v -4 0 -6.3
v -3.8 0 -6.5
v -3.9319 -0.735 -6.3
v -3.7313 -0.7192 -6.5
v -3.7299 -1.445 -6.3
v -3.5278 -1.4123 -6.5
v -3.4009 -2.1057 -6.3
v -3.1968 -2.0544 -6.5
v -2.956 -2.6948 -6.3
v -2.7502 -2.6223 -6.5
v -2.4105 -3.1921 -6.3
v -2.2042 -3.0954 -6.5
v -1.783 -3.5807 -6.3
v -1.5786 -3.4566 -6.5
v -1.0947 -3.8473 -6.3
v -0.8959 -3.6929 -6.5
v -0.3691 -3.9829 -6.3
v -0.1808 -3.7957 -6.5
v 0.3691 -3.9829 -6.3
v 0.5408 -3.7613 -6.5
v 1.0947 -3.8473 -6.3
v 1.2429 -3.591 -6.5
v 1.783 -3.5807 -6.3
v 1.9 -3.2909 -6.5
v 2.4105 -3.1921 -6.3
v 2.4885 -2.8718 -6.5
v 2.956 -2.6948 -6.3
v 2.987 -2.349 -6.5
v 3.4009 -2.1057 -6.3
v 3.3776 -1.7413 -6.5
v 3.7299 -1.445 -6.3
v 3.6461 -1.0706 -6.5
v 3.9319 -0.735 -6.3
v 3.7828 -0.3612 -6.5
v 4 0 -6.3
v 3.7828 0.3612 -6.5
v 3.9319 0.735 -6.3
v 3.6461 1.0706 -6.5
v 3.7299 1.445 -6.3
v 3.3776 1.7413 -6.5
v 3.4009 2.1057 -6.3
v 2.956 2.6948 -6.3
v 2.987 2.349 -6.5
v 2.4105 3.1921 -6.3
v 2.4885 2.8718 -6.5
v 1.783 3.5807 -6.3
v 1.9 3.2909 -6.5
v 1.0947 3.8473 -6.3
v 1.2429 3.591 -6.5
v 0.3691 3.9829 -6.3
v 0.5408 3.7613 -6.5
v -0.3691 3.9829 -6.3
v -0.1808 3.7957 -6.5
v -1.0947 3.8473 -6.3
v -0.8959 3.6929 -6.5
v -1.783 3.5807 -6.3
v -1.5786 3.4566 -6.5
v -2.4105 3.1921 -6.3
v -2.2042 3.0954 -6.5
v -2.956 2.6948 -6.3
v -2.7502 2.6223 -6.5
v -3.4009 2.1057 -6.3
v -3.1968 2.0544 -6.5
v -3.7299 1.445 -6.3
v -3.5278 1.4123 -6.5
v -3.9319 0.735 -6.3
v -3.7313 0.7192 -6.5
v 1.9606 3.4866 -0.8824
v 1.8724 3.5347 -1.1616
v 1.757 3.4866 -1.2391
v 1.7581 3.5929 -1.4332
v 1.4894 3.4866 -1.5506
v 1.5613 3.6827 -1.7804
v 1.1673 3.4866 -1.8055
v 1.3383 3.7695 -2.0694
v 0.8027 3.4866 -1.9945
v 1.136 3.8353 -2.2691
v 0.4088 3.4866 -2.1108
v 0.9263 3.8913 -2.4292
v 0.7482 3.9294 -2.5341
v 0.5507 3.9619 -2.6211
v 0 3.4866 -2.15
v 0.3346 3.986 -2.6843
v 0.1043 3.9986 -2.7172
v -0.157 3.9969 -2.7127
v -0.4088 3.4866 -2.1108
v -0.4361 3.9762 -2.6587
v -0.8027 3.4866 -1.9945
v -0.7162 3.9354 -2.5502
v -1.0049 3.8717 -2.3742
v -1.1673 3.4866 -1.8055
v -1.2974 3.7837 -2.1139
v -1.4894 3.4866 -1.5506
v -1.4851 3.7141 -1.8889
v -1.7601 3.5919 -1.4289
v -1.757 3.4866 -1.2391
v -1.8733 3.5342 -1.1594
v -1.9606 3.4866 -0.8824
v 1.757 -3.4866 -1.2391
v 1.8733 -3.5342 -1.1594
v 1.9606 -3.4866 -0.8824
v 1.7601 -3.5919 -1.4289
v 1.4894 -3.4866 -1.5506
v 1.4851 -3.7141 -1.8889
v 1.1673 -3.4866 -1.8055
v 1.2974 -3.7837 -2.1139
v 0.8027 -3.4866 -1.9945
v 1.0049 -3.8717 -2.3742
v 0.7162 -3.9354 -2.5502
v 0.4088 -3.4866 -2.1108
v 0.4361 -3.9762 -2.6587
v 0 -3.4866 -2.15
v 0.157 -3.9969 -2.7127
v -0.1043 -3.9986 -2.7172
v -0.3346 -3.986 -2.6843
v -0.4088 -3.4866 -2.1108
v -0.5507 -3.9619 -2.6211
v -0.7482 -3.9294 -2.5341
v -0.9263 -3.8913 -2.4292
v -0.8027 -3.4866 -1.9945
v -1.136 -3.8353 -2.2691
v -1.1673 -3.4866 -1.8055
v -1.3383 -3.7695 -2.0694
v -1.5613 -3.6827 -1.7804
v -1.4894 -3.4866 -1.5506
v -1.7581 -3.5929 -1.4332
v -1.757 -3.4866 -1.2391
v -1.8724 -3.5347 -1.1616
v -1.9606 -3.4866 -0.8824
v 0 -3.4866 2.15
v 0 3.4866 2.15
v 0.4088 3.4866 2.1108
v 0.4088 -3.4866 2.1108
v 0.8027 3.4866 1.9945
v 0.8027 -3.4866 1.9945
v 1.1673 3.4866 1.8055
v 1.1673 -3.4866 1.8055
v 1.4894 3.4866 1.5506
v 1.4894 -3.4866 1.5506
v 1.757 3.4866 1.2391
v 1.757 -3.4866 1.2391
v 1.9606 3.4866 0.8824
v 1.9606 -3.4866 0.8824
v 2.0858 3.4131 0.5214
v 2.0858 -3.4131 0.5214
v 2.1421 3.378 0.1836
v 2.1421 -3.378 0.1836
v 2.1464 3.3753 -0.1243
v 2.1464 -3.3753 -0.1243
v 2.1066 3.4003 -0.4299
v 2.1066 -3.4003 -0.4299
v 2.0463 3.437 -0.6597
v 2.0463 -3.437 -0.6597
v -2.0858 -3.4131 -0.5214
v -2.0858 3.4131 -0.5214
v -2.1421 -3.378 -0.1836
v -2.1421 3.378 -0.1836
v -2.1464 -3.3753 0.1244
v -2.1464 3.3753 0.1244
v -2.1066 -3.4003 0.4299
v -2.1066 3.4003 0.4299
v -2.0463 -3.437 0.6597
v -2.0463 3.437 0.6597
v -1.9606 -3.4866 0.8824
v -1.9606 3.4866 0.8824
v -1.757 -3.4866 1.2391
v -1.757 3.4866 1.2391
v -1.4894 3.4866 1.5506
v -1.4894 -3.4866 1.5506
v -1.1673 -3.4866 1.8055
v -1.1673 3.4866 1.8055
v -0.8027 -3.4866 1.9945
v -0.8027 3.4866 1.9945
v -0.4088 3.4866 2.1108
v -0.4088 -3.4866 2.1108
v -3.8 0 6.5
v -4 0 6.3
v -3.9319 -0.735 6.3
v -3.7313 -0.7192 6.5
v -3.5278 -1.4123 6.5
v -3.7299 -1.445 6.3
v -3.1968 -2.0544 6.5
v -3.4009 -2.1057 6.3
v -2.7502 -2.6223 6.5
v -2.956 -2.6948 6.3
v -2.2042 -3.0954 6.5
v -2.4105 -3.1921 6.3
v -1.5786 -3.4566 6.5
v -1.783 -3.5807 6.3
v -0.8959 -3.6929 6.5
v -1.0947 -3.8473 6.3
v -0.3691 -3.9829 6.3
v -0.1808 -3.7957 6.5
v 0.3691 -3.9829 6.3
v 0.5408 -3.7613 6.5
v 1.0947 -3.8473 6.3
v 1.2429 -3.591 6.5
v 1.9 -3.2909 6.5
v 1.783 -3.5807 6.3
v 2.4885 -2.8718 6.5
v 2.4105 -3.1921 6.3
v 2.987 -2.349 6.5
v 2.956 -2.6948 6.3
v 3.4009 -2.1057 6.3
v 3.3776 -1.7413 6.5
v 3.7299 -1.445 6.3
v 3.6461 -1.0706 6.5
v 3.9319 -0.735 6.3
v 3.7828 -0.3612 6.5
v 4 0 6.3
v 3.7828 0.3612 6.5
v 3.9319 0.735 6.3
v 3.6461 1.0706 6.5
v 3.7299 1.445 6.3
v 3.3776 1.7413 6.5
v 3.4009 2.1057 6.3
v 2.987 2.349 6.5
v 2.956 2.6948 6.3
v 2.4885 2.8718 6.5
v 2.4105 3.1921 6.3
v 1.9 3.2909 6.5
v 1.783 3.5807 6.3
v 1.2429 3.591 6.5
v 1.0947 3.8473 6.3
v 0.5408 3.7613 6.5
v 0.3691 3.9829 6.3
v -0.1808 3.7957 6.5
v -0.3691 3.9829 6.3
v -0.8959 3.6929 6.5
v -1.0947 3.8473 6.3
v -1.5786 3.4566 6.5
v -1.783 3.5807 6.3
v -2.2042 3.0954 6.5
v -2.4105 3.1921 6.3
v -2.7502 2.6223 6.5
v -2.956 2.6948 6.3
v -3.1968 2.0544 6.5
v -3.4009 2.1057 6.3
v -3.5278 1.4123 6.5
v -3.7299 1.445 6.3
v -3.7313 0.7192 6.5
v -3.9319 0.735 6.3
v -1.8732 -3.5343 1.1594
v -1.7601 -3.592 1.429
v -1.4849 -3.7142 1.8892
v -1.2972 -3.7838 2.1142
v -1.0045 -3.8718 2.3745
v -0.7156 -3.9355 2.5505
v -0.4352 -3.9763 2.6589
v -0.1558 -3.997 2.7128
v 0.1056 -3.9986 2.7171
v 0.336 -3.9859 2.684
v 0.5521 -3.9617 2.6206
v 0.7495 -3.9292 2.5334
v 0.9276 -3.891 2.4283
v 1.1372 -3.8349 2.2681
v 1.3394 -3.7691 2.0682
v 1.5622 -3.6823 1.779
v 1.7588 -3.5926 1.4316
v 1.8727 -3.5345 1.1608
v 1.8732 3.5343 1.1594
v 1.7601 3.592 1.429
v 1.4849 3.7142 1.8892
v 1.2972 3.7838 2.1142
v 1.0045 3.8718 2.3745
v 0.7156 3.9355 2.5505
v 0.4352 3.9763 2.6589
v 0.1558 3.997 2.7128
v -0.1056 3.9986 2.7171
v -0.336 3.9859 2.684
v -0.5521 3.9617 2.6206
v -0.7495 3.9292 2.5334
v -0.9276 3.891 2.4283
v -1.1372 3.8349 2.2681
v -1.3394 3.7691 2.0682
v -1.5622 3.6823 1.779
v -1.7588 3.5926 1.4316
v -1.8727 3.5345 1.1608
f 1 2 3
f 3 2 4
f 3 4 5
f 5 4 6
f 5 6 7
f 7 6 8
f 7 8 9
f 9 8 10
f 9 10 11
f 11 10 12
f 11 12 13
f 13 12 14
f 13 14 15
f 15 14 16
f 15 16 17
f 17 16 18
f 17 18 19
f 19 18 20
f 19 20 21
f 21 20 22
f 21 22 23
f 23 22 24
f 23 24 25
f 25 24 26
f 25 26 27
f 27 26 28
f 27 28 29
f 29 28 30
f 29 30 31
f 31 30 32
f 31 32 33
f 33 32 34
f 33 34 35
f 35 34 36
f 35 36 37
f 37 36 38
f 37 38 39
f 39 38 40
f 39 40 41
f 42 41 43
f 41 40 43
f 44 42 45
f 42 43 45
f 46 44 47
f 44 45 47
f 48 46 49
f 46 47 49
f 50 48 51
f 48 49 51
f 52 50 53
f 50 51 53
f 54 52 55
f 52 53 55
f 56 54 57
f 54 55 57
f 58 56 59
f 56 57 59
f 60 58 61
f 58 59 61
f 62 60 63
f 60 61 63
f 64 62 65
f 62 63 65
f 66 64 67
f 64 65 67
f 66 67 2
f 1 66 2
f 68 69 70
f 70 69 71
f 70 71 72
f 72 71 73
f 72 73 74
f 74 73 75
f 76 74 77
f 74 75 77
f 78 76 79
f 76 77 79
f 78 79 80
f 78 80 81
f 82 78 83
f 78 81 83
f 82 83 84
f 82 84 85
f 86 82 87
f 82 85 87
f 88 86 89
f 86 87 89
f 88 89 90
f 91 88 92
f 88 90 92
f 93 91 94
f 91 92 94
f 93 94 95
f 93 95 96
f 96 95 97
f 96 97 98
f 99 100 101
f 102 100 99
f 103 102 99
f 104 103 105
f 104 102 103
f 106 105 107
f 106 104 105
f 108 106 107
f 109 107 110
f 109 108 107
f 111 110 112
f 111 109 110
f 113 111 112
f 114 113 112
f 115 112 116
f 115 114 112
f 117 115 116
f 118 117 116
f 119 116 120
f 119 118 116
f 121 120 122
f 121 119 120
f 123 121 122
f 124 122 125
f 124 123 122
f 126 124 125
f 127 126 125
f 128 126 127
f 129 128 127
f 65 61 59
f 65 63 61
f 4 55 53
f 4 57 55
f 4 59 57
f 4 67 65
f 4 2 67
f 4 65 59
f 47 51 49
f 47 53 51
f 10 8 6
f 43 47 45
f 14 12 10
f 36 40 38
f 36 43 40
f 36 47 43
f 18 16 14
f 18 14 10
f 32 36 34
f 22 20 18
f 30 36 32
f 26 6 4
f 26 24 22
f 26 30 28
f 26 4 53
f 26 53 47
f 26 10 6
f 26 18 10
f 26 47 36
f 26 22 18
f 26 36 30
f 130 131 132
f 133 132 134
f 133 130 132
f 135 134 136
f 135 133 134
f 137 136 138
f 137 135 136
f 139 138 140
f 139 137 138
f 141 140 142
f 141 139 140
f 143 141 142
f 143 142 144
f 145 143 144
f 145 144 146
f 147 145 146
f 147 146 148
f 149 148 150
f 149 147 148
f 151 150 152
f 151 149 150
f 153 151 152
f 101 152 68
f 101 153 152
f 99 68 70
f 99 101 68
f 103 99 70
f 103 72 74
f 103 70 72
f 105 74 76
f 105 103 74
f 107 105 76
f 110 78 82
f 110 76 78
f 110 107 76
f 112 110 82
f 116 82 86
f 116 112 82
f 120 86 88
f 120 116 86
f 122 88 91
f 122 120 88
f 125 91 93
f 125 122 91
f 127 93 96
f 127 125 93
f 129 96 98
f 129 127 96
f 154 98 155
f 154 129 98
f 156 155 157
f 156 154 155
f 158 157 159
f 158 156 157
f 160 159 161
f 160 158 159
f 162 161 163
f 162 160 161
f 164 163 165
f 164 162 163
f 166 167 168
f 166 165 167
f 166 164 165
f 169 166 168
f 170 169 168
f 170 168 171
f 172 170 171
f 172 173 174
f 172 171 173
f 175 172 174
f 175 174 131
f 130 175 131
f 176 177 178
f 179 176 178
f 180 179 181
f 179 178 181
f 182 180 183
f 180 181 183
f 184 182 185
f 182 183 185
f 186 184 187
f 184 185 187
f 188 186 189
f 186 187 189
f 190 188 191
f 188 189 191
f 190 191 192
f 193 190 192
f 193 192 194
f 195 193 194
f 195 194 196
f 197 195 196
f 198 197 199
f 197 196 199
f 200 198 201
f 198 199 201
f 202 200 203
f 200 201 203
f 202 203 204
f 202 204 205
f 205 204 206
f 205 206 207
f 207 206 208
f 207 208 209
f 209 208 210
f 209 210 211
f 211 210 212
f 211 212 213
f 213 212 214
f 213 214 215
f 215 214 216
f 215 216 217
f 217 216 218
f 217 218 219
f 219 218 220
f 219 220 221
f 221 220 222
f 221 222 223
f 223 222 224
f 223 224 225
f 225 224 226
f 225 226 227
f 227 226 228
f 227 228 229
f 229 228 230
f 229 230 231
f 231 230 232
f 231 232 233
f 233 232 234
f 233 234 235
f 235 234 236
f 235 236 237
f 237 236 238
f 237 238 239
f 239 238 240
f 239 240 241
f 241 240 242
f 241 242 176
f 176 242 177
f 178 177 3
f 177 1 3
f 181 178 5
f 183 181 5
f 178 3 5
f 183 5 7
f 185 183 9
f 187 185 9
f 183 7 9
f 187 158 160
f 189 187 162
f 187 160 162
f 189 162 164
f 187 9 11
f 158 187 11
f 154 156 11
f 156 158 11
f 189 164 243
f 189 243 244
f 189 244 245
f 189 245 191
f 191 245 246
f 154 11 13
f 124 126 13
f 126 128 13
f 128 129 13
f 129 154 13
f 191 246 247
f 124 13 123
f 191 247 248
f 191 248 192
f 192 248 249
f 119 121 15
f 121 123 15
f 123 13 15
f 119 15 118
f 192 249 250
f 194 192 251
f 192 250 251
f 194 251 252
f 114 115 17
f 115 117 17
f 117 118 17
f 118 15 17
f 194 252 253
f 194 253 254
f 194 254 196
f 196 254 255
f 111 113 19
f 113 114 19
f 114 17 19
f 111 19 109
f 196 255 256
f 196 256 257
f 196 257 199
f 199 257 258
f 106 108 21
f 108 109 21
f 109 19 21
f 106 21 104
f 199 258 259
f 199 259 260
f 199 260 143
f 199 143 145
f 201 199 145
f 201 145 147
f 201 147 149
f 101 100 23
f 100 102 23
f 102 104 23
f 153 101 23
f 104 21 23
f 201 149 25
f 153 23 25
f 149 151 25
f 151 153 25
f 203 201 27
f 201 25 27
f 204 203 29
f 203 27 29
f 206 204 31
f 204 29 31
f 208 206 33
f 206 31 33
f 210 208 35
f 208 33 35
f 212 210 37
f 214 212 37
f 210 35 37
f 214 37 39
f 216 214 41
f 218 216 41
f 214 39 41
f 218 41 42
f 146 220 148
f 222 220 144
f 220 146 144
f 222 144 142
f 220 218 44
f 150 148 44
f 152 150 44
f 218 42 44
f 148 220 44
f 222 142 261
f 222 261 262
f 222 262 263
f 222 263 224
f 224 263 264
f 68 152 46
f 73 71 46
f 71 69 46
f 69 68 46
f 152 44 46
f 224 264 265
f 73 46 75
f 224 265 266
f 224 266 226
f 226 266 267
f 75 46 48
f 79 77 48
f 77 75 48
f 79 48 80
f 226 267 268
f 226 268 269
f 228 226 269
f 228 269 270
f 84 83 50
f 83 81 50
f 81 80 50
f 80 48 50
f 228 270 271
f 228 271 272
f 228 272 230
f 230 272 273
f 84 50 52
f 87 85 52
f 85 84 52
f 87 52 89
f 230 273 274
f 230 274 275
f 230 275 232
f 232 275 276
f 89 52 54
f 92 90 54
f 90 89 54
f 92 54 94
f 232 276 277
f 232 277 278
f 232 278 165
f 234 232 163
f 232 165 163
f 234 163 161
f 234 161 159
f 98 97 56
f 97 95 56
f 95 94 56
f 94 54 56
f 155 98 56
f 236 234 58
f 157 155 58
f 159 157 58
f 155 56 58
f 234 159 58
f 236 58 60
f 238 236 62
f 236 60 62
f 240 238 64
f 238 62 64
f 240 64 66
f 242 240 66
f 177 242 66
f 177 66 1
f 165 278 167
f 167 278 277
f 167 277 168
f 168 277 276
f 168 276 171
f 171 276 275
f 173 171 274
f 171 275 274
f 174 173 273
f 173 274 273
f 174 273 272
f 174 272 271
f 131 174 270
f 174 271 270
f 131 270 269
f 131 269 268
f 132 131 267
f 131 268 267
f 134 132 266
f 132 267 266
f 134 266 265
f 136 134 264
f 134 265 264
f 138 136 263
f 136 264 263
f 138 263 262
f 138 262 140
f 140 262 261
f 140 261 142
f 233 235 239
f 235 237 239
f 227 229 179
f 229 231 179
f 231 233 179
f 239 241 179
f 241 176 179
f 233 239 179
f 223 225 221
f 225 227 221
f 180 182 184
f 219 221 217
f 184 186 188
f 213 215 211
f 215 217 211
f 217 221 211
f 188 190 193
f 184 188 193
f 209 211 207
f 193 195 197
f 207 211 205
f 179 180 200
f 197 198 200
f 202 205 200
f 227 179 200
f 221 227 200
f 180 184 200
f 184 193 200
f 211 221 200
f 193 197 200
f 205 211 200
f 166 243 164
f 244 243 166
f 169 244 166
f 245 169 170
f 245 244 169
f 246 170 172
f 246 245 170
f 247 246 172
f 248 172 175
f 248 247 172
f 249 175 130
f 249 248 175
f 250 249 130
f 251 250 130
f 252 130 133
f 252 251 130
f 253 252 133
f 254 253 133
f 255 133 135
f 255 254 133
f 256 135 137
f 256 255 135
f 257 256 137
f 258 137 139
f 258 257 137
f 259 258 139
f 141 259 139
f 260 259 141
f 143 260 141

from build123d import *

# Parameters (mm, degrees)
CROQUIS1_W                 = 4
CROQUIS1_H                 = 13
CHAFL_N1_SIZE              = 0.2
CORTAR_EXTRUIR1_DEPTH      = 9.61684397
CORTAR_EXTRUIR1_DEPTH_BACK = 9.61684397
CROQUIS2_R                 = 2.15


with BuildPart() as part:
    # Croquis1 → Revolución1 (revolve)
    with BuildSketch(Plane(origin=(0, 0, 0), x_dir=(1, 0, 0), z_dir=(0, 1, 0)), mode=Mode.PRIVATE) as revoluci_n1_sk:
        with Locations((2, 0)):
            Rectangle(CROQUIS1_W, CROQUIS1_H)
    revolve(revoluci_n1_sk.sketch.rotate(Axis((0, 0, -6.5), (0, 0, 1)), 180), axis=Axis((0, 0, -6.5), (0, 0, 1)))

    # Chaflán1
    chafl_n1_edges = [part.edges().sort_by_distance(p)[0] for p in [
        (4, 0, 6.5),
        (4, 0, -6.5),
    ]]
    chamfer(chafl_n1_edges, length=CHAFL_N1_SIZE)

    # Croquis2 → Cortar-Extruir1 (cut, two sides: drawn at the far end of the back side and taken through both)
    with BuildSketch(Plane(origin=(0, 0, 0), x_dir=(1, 0, 0), z_dir=(0, 1, 0)).offset(-CORTAR_EXTRUIR1_DEPTH_BACK)):
        with Locations(Location((0, 0, 0), (0, 0, 270))):
            Circle(CROQUIS2_R)
    extrude(amount=CORTAR_EXTRUIR1_DEPTH + CORTAR_EXTRUIR1_DEPTH_BACK, mode=Mode.SUBTRACT)

    # Croquis3 → Cortar-Revolución1 (revolve, cut)
    with BuildSketch(Plane(origin=(0, 0, 0), x_dir=(0, 0, -1), z_dir=(1, 0, 0))):
        Polygon((0, 2.827658977), (-1.417641815, 2.827658977), (-3.618319017, 4.807613665), (0, 4.807613665), align=None)
    cortar_revoluci_n1 = revolve(axis=Axis((0, 0, 0), (0, 1, 0)), mode=Mode.SUBTRACT)

    # Simetría1: Cortar-Revolución1 across plane
    add(cortar_revoluci_n1.mirror(Plane.ZX), mode=Mode.SUBTRACT)


solid = part.part
